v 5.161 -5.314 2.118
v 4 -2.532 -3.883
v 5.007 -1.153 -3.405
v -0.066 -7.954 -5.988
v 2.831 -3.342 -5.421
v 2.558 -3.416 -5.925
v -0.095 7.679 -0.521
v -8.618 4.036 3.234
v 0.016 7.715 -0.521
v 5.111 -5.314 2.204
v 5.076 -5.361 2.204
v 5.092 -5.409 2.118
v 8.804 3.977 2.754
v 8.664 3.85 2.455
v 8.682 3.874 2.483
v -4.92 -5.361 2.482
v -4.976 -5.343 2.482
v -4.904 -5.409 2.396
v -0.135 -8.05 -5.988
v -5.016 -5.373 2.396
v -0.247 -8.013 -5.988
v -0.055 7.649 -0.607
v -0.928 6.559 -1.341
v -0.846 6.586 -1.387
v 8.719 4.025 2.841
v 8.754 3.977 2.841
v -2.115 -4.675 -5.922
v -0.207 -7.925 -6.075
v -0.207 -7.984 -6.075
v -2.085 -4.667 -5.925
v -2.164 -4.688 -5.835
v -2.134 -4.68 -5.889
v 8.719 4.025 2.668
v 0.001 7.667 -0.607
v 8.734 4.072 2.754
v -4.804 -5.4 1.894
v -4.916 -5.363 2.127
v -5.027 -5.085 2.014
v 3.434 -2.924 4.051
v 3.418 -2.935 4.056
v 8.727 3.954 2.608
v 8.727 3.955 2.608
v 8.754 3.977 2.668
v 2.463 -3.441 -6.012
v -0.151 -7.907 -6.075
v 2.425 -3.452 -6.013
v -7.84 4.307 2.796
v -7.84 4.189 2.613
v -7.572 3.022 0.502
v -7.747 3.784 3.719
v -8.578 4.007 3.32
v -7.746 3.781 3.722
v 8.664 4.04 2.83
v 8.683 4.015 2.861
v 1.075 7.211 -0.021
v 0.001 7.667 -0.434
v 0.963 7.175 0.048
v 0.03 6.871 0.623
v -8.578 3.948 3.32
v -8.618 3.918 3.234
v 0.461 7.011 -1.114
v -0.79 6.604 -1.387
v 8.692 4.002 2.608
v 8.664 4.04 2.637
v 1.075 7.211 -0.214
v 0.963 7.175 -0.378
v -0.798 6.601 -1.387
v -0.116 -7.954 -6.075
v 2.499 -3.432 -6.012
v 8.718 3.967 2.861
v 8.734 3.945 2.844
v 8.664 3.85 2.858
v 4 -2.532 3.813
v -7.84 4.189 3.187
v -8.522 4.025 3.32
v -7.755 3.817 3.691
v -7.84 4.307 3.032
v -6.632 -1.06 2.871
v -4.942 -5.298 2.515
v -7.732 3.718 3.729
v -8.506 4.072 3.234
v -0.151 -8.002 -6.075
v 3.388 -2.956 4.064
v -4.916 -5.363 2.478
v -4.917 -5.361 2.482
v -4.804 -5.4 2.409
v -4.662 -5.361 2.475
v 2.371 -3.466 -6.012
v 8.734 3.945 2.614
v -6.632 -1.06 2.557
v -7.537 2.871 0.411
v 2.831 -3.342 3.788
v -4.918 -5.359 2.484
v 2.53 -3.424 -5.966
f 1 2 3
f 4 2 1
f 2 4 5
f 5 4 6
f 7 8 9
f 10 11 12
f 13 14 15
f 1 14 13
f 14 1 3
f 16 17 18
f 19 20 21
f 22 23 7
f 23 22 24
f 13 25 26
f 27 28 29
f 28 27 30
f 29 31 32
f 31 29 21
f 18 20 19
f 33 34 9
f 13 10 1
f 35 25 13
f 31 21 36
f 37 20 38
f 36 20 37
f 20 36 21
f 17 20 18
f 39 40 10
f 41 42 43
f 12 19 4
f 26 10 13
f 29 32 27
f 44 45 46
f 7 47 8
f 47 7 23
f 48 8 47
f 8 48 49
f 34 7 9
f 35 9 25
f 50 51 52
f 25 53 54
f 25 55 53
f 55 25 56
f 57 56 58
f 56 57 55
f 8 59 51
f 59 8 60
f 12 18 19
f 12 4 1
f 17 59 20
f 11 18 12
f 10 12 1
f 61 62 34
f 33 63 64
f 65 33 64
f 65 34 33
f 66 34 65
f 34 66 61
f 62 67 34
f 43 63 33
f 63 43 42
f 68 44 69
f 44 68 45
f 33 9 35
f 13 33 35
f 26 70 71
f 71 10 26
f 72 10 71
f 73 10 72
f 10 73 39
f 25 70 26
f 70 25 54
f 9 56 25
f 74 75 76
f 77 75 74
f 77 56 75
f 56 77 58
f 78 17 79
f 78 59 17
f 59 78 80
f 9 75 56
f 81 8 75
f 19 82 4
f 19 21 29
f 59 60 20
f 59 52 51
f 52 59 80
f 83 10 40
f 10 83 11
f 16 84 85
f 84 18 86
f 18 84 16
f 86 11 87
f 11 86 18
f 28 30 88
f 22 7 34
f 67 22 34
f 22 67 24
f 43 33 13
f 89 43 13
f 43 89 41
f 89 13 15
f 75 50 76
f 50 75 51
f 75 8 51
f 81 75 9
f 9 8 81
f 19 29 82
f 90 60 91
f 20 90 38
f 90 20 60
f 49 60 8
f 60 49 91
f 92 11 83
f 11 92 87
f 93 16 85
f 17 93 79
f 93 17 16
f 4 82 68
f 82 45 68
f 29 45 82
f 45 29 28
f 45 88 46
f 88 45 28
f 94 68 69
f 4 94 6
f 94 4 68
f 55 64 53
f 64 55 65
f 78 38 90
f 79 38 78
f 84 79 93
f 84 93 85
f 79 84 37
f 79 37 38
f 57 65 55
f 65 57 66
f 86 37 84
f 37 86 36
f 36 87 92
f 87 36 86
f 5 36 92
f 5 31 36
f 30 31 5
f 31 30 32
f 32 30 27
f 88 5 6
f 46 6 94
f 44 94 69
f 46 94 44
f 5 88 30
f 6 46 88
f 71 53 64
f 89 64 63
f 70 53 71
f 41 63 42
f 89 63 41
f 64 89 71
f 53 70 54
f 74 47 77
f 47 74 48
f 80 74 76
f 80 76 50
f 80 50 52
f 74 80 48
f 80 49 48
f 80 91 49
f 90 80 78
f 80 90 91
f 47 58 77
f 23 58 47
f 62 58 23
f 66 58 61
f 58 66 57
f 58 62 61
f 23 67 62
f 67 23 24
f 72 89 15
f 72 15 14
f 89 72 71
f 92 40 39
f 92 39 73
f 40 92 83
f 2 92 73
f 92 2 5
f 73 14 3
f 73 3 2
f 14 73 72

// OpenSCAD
// Auto-generated OpenSCAD file

    inner_points = 10*[[0.3968794289832836, -0.24366904809970863, 0.47769744652866364], [0.1044370337410087, 0.7116152041618212, 0.43400027446809336], [0.28001866757022104, -0.32472141302800633, -0.512137931997225], [-0.012423727672053866, 0.6305628392335235, -0.5558351040577953], [-0.483509439683674, -0.5304611105401444, 0.0999862435594168], [-0.7759518349259489, 0.4248231417213853, 0.05628907149884649], [-0.45353704140965617, 0.039673656440986374, 0.9209905083602004], [-0.6550920403237519, -0.10012099428325462, -0.7862229842742783], [0.8633541457398265, 0.39452214456670354, -0.13476752408592219]];

    outer_points = 10*[[0.5060778848187576, -0.5313859144211572, 0.21177232535318735], [0.4838884138968741, 0.07018910183659147, -0.5867357379715961], [-0.4935362337764729, -0.5313859144211572, 0.2395502645330591], [-0.5157257046983563, 0.07018910183659147, -0.5589577987917242], [0.020742555340540487, 0.1604093044556914, 0.7464395051009286], [-0.0014469155813429608, 0.76198432071344, -0.05206855822385477], [0.8703596761375976, 0.39772341860368887, 0.275448253298233], [-0.8537196482801497, 0.39772341860368887, 0.3233581114365443], [-0.016640027857447785, -0.7954468372073777, -0.5988063647347773]];

    // Convex hull for inner set (I)
    module inner_hull() {
        hull() {
            for (p = inner_points) {
                translate(p) sphere(r=0.1);
            }
        }
    }

    // Convex hull for outer set (O) minus inner hull (O \ I)
    module outer_minus_inner() {
        difference() {
            hull() {
                for (p = outer_points) {
                    translate(p) sphere(r=0.1);
                }
            }
            inner_hull(); // Subtract inner hull
        }
    }

    // Convex hull for outer set (O) minus all translated inner hulls
    module outer_minus_AllTranslationInner() {
        difference() {
            hull() {
                for (p = outer_points) {
                    translate(p) sphere(r=0.1);
                }
            }
            hull() {
                translate([0,0,50]) inner_hull();
                translate([0,0,-50]) inner_hull();
            }; // Subtract translated inner hulls
        }
    }

    // Difference between outer_minus_inner and outer_minus_AllTranslationInner
    module outer_minus_inner_diff() {
        difference() {
            // Outer minus inner
            difference() {
                hull() {
                    for (p = outer_points) {
                        translate(p) sphere(r=0.1);
                    }
                }
                inner_hull();
            }

            // Subtract Outer minus AllTranslationInner
            difference() {
                hull() {
                    for (p = outer_points) {
                        translate(p) sphere(r=0.1);
                    }
                }
                hull() {
                    translate([0,0,50]) inner_hull();
                    translate([0,0,-50]) inner_hull();
                };
            }
        }
    }

    // Rendering all with colors applied
    color([0, 1, 0, 1]) outer_minus_AllTranslationInner(); // Opaque green
    
